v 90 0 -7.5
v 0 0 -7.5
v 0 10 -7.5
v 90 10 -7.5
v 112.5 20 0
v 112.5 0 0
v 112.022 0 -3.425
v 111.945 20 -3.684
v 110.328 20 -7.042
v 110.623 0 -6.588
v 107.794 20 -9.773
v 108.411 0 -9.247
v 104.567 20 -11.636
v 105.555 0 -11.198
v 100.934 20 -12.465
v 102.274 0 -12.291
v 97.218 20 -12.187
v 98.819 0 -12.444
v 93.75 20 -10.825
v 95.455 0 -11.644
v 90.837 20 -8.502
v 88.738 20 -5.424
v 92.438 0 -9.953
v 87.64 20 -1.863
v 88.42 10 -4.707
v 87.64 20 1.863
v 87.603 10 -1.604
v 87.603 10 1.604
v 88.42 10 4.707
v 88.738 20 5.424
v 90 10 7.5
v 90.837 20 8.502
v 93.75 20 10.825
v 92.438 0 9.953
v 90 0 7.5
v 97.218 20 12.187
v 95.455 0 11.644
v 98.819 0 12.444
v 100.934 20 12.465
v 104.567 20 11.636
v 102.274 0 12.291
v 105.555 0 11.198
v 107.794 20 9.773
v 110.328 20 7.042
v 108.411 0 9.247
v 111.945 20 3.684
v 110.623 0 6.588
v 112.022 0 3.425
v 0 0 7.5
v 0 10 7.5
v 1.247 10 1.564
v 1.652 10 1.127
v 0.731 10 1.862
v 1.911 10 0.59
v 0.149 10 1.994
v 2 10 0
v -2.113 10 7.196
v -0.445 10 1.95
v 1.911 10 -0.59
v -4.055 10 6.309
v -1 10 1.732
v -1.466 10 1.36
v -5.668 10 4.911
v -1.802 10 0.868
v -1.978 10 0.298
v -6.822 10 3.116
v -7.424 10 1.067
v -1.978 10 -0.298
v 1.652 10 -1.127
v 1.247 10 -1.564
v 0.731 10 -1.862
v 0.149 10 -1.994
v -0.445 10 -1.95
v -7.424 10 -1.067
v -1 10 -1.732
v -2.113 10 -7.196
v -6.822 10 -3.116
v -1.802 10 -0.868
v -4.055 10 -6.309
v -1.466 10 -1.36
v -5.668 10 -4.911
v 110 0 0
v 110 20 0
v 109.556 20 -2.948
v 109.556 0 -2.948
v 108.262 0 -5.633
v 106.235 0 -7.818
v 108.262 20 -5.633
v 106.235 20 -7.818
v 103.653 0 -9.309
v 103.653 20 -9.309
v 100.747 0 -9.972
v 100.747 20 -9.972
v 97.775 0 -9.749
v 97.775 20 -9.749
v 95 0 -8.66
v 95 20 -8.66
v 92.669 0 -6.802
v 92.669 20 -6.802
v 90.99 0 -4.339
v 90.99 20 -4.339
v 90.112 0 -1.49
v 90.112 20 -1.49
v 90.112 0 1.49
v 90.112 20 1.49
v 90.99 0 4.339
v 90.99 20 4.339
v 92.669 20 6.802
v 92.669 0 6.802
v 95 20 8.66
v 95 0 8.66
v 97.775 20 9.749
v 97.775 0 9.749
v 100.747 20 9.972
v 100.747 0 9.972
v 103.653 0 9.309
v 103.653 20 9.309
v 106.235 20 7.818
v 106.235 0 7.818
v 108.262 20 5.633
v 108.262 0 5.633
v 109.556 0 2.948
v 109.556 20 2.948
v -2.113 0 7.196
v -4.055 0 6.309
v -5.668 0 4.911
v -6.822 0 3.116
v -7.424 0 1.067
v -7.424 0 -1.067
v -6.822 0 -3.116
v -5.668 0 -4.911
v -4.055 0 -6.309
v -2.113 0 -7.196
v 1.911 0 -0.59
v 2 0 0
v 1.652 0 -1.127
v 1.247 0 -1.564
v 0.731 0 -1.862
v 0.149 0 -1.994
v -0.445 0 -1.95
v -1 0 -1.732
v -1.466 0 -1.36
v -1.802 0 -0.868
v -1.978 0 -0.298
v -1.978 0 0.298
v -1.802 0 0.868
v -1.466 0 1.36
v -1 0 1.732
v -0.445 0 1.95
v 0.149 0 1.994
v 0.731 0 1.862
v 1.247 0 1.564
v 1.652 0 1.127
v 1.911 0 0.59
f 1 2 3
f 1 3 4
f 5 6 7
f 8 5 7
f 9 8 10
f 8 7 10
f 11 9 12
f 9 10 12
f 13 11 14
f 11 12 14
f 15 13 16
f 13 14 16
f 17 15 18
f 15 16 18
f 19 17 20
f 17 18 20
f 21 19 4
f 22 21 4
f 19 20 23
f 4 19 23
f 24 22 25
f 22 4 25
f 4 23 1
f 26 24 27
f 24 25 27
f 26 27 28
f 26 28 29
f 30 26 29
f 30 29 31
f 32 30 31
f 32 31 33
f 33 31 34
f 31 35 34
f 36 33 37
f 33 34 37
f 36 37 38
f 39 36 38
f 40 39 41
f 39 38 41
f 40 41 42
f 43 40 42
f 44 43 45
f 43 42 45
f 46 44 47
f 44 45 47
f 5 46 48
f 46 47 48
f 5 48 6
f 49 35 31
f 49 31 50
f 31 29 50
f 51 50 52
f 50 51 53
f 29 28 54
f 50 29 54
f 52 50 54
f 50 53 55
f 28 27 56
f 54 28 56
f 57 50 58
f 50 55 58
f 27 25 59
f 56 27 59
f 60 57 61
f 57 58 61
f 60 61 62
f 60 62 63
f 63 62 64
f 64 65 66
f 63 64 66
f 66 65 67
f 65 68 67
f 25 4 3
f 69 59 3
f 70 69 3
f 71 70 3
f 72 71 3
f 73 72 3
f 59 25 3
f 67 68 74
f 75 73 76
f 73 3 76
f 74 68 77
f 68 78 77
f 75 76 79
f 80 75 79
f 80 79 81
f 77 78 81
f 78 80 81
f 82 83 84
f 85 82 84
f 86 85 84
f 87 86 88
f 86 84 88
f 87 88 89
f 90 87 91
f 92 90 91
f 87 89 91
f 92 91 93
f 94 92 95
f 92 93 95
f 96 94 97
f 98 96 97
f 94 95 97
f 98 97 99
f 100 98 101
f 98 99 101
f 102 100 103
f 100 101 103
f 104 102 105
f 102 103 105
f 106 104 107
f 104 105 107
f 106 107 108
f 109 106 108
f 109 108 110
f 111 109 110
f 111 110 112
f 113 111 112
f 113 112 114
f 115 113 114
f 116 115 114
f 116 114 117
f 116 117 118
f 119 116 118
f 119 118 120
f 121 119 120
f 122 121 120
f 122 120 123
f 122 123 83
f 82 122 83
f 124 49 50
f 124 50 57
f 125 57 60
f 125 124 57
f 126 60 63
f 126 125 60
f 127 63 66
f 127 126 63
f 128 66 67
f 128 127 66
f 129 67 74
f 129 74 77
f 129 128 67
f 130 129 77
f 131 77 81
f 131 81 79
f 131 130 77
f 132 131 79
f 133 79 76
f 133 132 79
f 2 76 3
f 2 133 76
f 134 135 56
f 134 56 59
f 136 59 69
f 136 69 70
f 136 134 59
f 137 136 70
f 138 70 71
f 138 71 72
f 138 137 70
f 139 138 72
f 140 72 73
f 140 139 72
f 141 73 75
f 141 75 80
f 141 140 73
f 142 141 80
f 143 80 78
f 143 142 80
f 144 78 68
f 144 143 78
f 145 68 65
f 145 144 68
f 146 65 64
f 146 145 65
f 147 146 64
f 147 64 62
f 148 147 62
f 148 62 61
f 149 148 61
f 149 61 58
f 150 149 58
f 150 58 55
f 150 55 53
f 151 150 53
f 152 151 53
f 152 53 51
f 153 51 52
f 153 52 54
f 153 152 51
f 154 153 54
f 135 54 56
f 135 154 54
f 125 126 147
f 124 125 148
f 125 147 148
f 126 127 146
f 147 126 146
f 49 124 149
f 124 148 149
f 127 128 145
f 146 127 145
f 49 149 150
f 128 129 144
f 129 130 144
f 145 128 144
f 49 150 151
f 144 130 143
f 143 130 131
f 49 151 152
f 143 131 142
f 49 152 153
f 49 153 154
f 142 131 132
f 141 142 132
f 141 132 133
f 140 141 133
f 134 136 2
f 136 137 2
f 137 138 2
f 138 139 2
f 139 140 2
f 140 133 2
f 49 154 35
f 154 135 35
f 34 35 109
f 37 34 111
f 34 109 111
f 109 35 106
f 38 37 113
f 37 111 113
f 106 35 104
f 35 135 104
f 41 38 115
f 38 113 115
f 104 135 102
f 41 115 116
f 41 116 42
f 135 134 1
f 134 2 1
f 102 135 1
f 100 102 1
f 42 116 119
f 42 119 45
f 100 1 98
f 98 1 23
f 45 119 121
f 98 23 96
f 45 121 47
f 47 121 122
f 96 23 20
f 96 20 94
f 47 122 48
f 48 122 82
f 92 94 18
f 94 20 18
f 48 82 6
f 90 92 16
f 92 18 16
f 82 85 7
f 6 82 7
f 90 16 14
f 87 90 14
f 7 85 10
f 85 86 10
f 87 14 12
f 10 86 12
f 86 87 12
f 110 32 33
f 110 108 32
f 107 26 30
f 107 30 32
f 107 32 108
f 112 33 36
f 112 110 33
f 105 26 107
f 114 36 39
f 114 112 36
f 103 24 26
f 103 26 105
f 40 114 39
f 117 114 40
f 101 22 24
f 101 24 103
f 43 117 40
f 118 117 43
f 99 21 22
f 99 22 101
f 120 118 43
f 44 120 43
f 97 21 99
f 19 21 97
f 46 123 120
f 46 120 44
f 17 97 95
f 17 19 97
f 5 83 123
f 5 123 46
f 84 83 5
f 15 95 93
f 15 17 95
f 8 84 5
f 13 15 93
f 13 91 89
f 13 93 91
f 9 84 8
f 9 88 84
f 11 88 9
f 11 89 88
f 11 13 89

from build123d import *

# Parameters (mm, degrees)
SKETCH2_R           = 2
SKETCH2_R_2         = 2.5
BOSS_EXTRUDE1_DEPTH = 10
SKETCH3_R           = 12.5
BOSS_EXTRUDE3_DEPTH = 20
CUT_EXTRUDE1_REACH  = 22
SKETCH4_R           = 10


with BuildPart() as part:
    # Sketch2 → Boss-Extrude1 (new body)
    with BuildSketch(Plane(origin=(0, 0, 0), x_dir=(1, 0, 0), z_dir=(0, 1, 0))):
        with BuildLine():
            Line((0, 7.5), (100, 7.5))
            ThreePointArc((100, 7.5), (107.5, 0), (100, -7.5))
            Line((100, -7.5), (0, -7.5))
            ThreePointArc((0, -7.5), (-7.5, 0), (0, 7.5))
        make_face()
        Circle(SKETCH2_R, mode=Mode.SUBTRACT)
        with Locations((100, 0)):
            Circle(SKETCH2_R_2, mode=Mode.SUBTRACT)
    extrude(amount=BOSS_EXTRUDE1_DEPTH)

    # Sketch3 → Boss-Extrude3 (add)
    with BuildSketch(Plane(origin=(0, 0, 0), x_dir=(1, 0, 0), z_dir=(0, 1, 0))):
        with Locations((100, 0)):
            Circle(SKETCH3_R)
    extrude(amount=BOSS_EXTRUDE3_DEPTH)

    # Sketch4 → Cut-Extrude1 (cut, up to next)
    with BuildSketch(Plane(origin=(0, 20, 0), x_dir=(1, 0, 0), z_dir=(0, 1, 0)), mode=Mode.PRIVATE) as cut_extrude1_sk1:
        with Locations((100, 0)):
            Circle(SKETCH4_R)
    cut_extrude1_tool1 = extrude(cut_extrude1_sk1.sketch, amount=-CUT_EXTRUDE1_REACH, mode=Mode.PRIVATE) & part.part
    add(cut_extrude1_tool1.solids().sort_by_distance((100, 20, 0))[0], mode=Mode.SUBTRACT)


solid = part.part
